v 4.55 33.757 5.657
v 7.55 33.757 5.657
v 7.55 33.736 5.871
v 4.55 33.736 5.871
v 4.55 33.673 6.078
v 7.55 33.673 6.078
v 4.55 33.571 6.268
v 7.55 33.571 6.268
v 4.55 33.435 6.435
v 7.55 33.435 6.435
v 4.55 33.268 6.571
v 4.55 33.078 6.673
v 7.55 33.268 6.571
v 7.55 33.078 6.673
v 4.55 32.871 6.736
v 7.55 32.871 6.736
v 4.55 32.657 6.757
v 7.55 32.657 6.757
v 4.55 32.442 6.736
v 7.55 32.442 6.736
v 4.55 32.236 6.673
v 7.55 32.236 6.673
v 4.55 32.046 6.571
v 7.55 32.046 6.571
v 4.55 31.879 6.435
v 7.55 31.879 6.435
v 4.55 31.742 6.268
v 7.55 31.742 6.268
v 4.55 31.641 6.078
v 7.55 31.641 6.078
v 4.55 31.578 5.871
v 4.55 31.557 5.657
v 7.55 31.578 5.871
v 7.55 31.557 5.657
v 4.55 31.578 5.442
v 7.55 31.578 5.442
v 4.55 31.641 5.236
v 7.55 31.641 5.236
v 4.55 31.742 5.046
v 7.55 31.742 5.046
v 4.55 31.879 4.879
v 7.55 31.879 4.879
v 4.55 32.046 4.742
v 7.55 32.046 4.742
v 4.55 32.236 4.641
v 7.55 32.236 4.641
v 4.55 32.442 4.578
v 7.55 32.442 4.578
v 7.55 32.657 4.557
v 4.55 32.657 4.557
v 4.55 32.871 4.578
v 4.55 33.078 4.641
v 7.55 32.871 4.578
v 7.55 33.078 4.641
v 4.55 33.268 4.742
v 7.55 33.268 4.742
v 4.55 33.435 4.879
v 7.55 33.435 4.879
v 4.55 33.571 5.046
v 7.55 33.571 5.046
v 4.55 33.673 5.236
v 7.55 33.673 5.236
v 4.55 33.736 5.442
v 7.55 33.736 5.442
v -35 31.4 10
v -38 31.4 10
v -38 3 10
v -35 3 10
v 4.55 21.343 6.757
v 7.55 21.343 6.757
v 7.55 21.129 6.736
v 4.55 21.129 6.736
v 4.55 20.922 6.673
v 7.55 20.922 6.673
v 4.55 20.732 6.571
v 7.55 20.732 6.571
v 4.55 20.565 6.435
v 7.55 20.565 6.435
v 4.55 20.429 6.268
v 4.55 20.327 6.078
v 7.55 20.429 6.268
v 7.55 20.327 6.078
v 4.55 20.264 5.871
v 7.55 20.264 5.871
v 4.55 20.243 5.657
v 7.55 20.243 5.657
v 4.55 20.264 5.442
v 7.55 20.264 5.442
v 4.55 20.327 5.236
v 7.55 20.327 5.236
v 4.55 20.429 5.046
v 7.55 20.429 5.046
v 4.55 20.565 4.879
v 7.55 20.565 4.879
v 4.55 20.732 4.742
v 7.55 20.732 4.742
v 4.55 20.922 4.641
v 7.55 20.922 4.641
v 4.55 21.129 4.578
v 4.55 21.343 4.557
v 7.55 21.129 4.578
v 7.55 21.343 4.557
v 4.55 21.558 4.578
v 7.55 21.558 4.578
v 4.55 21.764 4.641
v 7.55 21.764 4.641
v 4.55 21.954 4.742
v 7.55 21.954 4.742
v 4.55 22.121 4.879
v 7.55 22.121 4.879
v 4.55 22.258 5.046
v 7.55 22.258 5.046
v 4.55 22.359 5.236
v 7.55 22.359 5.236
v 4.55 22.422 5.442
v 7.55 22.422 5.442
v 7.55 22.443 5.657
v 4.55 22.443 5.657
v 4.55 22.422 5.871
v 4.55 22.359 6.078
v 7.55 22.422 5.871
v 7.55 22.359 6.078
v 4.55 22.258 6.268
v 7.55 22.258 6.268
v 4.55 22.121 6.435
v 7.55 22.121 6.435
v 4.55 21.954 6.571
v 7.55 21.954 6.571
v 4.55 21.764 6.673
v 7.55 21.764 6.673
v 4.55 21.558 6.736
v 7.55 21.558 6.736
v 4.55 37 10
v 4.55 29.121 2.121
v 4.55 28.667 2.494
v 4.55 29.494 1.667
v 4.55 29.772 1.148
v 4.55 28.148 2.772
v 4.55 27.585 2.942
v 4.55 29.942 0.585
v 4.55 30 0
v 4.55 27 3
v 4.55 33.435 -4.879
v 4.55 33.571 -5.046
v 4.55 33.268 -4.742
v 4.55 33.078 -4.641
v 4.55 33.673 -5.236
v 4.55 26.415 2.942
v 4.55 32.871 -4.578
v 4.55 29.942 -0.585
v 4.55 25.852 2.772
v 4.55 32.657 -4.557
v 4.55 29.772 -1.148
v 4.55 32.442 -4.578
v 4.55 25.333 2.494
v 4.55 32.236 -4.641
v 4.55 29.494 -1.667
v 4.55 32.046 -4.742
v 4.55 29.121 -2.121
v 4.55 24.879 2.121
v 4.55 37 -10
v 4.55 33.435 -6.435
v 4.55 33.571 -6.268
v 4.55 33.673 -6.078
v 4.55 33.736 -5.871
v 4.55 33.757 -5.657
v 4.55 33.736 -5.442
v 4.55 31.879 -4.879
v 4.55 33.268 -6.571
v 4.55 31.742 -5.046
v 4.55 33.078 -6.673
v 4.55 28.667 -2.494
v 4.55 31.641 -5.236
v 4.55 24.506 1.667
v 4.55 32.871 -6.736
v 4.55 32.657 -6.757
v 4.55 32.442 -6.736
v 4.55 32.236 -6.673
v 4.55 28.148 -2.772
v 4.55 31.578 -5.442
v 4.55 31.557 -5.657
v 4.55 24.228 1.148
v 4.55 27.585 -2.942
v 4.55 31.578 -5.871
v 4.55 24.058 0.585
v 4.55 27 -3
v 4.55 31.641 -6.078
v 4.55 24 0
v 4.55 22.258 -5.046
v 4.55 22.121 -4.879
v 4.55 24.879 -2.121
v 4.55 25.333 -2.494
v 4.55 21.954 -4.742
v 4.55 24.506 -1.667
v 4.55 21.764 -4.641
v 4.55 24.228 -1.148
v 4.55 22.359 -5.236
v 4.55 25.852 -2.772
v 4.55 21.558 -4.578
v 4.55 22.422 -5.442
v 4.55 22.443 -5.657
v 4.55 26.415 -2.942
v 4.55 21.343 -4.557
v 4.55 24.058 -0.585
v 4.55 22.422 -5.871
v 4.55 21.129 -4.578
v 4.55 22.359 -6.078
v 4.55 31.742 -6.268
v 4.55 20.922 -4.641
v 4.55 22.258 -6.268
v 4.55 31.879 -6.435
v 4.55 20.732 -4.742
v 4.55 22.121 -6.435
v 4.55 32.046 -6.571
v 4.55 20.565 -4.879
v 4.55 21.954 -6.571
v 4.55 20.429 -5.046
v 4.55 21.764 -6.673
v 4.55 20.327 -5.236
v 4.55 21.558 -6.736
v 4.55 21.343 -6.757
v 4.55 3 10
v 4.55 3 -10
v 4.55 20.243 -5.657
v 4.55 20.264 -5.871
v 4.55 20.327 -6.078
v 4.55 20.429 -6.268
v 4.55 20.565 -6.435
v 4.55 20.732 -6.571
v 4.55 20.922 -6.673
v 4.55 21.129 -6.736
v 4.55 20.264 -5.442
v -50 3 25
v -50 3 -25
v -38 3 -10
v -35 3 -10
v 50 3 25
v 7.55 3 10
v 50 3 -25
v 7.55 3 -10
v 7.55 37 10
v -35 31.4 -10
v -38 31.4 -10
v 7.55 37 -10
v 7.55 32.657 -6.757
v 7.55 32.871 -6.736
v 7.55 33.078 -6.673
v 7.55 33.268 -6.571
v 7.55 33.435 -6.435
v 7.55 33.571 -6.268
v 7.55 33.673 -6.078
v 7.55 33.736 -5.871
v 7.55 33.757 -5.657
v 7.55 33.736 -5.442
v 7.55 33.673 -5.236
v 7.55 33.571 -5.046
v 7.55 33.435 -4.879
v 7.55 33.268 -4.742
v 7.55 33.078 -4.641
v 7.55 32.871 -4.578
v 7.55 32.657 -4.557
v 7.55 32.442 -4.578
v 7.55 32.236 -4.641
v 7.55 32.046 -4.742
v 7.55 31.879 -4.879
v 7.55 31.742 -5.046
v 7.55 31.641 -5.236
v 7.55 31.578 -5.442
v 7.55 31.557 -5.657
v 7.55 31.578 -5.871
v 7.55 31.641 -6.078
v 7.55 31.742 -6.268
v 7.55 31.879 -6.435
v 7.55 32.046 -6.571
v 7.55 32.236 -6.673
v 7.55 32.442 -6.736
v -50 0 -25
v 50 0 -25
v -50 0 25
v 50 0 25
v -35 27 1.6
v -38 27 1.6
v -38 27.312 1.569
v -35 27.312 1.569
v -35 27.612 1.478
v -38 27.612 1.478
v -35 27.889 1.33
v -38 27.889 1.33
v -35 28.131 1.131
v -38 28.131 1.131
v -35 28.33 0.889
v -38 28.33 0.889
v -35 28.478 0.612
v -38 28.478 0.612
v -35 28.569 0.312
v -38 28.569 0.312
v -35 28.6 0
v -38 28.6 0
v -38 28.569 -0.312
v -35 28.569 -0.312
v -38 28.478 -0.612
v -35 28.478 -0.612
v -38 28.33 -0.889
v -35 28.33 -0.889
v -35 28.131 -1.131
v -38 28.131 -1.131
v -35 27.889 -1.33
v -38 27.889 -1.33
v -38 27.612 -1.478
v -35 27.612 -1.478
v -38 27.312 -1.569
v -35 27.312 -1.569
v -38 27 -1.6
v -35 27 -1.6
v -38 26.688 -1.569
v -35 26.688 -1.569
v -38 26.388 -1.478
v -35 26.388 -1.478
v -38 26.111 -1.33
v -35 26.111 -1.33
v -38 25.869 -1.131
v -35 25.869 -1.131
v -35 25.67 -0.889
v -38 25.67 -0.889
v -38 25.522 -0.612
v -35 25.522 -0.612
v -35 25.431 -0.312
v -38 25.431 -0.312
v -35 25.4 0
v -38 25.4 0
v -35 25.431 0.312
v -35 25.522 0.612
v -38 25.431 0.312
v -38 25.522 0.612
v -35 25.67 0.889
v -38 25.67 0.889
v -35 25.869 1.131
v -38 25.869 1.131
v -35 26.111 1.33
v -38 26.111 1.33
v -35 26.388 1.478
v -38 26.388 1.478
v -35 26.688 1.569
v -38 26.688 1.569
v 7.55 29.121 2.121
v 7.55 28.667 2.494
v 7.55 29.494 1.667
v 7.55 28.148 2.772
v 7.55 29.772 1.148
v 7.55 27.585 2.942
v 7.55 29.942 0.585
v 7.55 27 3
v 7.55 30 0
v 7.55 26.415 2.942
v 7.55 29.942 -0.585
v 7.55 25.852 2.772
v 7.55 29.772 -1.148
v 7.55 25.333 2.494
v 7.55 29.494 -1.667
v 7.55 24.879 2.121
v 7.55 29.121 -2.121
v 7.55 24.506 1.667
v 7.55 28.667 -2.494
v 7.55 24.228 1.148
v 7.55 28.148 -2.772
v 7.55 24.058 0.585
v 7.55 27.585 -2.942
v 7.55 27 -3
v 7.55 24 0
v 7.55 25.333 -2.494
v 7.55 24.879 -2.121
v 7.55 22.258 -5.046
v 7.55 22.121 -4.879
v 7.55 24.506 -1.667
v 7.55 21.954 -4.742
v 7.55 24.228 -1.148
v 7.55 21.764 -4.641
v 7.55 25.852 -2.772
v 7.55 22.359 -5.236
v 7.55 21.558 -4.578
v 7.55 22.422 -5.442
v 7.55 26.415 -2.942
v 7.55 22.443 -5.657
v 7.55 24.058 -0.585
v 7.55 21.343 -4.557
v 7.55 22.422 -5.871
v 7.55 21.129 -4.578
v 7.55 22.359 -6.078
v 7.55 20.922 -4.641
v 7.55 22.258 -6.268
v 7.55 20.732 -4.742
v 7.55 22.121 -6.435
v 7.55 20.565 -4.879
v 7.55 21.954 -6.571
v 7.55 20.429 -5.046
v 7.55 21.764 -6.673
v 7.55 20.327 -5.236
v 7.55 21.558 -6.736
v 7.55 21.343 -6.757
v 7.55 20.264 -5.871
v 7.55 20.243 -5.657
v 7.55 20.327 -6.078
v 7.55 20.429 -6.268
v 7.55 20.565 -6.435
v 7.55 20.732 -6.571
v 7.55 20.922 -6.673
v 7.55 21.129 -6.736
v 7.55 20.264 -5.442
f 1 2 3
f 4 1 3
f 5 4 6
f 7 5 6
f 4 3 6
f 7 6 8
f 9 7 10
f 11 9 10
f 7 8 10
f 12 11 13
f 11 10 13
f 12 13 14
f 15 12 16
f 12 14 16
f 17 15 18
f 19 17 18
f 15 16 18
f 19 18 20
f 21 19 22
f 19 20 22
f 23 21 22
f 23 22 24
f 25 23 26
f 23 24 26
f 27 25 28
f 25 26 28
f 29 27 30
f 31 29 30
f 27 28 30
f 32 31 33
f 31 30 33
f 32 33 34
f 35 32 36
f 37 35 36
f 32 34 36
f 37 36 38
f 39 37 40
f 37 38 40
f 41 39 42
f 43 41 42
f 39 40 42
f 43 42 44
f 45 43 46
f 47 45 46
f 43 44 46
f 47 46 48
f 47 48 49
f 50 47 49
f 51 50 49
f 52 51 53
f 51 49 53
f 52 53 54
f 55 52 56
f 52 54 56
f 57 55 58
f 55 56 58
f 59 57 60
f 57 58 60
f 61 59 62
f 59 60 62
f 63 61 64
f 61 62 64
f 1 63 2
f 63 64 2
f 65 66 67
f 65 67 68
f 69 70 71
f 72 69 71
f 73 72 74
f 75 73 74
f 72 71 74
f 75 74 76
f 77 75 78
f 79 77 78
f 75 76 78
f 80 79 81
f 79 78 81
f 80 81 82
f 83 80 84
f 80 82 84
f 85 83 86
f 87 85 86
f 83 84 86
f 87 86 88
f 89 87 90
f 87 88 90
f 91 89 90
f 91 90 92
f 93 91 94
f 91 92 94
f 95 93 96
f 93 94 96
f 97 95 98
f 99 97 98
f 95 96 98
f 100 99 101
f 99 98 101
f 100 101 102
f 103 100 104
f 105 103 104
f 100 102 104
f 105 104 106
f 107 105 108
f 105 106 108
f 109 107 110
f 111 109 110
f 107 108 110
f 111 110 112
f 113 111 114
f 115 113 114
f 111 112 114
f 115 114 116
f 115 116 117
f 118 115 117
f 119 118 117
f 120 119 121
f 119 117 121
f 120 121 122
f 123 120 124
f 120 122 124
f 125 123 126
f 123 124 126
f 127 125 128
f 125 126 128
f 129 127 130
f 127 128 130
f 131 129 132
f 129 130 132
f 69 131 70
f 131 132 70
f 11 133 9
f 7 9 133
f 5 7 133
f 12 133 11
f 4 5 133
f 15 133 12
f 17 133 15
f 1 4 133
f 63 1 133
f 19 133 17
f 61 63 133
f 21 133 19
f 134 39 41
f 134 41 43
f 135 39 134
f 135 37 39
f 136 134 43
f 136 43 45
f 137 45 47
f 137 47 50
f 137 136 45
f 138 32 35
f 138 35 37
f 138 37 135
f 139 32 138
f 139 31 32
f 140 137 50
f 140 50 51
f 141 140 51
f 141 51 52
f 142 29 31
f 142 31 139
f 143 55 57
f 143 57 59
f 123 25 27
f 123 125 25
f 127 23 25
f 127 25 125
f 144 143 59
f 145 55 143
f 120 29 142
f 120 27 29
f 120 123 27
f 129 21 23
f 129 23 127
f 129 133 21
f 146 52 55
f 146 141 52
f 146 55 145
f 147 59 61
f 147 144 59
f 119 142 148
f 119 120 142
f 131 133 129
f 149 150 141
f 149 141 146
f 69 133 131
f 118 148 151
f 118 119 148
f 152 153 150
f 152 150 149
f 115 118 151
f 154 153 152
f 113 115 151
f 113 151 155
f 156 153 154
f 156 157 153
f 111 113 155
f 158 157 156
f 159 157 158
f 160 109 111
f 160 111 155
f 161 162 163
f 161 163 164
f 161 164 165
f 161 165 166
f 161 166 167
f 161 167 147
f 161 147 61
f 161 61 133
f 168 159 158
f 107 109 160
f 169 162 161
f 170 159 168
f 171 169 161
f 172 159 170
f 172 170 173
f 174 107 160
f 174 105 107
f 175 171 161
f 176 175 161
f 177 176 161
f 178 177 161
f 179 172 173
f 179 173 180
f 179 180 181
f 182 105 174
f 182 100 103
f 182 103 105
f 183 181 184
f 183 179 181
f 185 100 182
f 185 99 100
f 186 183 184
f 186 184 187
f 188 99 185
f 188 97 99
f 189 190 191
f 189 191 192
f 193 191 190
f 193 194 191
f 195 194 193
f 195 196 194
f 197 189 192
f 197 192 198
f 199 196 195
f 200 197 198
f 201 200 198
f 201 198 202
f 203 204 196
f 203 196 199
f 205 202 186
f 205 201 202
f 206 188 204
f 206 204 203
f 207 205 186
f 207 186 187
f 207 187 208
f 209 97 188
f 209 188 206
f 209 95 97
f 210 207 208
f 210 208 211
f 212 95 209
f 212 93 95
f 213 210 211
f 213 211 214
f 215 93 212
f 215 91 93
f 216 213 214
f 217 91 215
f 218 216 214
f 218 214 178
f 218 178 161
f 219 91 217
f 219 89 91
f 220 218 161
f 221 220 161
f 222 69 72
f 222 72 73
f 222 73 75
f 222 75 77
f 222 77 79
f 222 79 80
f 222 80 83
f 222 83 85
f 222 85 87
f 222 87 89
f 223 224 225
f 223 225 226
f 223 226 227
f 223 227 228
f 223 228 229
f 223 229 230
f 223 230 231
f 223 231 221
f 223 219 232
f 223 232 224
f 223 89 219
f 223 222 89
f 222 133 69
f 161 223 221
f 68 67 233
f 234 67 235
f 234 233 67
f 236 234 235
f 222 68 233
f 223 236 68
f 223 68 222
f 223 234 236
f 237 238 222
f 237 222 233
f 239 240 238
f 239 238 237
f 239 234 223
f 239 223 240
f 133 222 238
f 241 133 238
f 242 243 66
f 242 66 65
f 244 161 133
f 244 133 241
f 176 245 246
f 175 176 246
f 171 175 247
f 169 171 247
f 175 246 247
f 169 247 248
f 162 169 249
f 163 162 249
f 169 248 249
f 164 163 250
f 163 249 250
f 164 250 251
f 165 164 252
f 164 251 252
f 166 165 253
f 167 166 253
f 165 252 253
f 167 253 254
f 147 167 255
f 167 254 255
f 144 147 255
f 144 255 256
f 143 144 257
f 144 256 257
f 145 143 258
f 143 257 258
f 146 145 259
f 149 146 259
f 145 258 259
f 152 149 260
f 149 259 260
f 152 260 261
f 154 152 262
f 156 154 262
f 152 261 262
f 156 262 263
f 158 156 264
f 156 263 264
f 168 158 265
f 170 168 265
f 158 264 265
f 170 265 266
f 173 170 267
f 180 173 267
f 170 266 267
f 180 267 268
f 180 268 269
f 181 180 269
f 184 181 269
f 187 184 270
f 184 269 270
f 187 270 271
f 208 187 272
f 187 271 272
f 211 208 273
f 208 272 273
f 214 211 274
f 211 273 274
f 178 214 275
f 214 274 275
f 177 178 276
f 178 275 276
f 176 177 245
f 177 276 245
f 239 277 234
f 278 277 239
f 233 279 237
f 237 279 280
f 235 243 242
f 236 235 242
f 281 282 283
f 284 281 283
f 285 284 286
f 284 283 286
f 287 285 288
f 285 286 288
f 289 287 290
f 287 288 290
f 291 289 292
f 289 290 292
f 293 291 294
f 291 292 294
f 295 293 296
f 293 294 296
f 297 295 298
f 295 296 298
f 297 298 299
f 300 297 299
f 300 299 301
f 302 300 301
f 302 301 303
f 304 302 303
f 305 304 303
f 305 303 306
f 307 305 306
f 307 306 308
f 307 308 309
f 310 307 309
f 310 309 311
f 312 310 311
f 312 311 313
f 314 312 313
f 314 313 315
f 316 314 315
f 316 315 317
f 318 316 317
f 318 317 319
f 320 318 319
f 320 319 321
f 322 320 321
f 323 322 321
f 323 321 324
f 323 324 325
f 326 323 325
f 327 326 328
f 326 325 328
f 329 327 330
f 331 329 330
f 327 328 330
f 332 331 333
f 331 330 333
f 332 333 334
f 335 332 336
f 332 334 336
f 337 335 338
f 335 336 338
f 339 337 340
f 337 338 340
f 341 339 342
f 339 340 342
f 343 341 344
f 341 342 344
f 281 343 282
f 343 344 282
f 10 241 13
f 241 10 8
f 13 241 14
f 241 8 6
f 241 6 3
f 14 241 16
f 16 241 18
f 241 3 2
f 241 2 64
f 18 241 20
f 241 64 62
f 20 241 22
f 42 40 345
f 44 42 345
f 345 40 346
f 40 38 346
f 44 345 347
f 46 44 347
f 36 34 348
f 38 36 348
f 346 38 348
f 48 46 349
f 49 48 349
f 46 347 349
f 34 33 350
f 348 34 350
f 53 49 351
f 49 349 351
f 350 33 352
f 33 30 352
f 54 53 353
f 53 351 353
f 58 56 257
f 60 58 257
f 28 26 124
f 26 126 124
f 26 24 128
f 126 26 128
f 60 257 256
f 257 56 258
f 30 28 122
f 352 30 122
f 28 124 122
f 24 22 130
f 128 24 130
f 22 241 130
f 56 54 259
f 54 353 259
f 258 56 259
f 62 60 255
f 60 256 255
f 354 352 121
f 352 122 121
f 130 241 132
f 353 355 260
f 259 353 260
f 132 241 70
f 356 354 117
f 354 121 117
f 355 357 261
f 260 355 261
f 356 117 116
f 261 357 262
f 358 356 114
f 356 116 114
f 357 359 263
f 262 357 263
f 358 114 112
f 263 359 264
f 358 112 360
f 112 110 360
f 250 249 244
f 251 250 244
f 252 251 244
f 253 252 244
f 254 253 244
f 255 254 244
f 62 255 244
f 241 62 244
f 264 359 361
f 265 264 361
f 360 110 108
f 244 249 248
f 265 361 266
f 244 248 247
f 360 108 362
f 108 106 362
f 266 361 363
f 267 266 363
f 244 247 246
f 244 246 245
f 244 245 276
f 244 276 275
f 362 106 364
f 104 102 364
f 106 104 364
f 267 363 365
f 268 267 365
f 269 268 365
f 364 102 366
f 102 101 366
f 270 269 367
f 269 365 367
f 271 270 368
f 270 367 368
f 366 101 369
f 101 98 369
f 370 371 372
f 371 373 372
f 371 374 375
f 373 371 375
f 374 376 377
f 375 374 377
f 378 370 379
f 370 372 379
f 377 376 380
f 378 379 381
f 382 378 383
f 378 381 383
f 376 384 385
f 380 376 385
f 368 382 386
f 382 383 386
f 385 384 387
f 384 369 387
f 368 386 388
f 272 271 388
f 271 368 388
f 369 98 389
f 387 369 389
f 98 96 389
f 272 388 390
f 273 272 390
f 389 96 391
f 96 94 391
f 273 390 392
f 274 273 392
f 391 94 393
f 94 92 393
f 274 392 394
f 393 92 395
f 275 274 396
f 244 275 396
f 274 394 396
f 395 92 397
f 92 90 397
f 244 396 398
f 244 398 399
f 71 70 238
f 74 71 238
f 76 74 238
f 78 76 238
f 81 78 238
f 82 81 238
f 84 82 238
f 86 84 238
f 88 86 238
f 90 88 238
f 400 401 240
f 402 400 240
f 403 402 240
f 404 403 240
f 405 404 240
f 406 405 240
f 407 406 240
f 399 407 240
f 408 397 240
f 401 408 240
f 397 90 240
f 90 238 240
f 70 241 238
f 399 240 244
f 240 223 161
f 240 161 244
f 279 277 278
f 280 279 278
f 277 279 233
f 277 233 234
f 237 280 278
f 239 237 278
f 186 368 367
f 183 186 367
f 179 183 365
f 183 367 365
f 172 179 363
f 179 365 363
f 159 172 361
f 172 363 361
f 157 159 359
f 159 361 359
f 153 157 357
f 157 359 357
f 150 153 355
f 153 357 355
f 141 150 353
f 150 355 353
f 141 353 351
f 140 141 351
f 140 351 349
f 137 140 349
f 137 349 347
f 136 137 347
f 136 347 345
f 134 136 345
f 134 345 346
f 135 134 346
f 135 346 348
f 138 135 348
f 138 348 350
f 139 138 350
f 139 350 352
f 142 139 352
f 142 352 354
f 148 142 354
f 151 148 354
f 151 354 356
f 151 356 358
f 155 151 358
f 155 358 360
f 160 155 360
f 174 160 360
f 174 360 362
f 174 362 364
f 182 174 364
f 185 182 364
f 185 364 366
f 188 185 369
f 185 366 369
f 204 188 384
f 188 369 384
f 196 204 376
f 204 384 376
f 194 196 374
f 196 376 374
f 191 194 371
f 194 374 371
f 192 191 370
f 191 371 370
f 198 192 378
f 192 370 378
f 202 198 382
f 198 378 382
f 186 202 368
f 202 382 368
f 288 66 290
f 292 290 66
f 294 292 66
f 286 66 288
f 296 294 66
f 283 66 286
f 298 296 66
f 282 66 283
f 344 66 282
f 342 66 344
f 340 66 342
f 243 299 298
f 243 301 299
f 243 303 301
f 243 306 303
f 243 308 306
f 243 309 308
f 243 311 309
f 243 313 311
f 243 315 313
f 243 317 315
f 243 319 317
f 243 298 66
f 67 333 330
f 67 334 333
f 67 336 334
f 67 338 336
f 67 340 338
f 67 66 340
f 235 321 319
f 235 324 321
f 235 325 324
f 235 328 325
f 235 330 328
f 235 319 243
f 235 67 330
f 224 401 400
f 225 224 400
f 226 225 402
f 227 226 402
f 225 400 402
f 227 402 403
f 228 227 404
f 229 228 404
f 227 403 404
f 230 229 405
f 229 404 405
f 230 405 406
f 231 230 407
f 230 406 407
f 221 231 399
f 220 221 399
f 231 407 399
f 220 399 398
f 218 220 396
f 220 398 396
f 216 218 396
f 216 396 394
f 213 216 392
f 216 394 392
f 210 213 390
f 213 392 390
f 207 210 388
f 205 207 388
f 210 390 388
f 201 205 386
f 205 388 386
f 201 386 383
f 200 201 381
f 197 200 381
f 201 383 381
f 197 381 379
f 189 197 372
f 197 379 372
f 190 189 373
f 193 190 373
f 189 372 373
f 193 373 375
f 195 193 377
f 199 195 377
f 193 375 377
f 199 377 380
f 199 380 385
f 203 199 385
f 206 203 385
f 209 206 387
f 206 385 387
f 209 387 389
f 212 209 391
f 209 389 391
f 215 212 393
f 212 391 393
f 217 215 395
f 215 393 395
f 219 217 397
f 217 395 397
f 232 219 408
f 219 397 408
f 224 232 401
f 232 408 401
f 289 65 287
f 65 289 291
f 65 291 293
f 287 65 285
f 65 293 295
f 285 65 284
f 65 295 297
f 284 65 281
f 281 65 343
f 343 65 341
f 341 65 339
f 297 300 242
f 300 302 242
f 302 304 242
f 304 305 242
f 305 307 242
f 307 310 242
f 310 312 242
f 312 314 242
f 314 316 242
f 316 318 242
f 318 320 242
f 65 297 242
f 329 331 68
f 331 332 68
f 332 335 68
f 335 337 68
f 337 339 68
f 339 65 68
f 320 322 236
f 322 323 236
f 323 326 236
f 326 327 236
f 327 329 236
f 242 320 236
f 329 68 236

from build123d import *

# Parameters (mm, degrees)
SKETCH1_W           = 100
SKETCH1_H           = 50
SKETCH1_W_2         = 3
SKETCH1_H_2         = 20
BOSS_EXTRUDE1_DEPTH = 3
SKETCH1_3_W         = 3
SKETCH1_3_H         = 20
BOSS_EXTRUDE2_DEPTH = 37
SKETCH1_4_W         = 3
SKETCH1_4_H         = 20
BOSS_EXTRUDE3_DEPTH = 31.4
SKETCH2_R           = 3
SKETCH2_R_2         = 1.1
CUT_EXTRUDE1_DEPTH  = 3
CIRPATTERN1_COUNT   = 4
SKETCH3_R           = 1.6
CUT_EXTRUDE2_DEPTH  = 15


with BuildPart() as part:
    # Sketch1 → Boss-Extrude1 (new body)
    with BuildSketch(Plane(origin=(0, 0, 0), x_dir=(1, 0, 0), z_dir=(0, 1, 0))):
        Rectangle(SKETCH1_W, SKETCH1_H)
        with Locations((-36.5, 0)):
            Rectangle(SKETCH1_W_2, SKETCH1_H_2, mode=Mode.SUBTRACT)
        with Locations((6.05, 0)):
            Rectangle(SKETCH1_W_2, SKETCH1_H_2, mode=Mode.SUBTRACT)
    extrude(amount=BOSS_EXTRUDE1_DEPTH)

    # Sketch1<3> → Boss-Extrude2 (add)
    with BuildSketch(Plane(origin=(0, 0, 0), x_dir=(1, 0, 0), z_dir=(0, 1, 0))):
        with Locations((6.05, 0)):
            Rectangle(SKETCH1_3_W, SKETCH1_3_H)
    extrude(amount=BOSS_EXTRUDE2_DEPTH)

    # Sketch1<4> → Boss-Extrude3 (add)
    with BuildSketch(Plane(origin=(0, 0, 0), x_dir=(1, 0, 0), z_dir=(0, 1, 0))):
        with Locations((-36.5, 0)):
            Rectangle(SKETCH1_4_W, SKETCH1_4_H)
    extrude(amount=BOSS_EXTRUDE3_DEPTH)

    # Sketch2 → Cut-Extrude1 (cut)
    with BuildSketch(Plane(origin=(7.55, 0, 0), x_dir=(0, 0, -1), z_dir=(1, 0, 0))):
        with Locations((0, 27)):
            Circle(SKETCH2_R)
        with Locations((5.656854249, 32.656854249)):
            Circle(SKETCH2_R_2)
    cut_extrude1 = extrude(amount=-CUT_EXTRUDE1_DEPTH, mode=Mode.SUBTRACT)

    # CirPattern1: Cut-Extrude1 ×4 about axis
    cirpattern1_axis = Axis((0, 27, 0), (1, 0, 0))
    for i in range(1, CIRPATTERN1_COUNT):
        add(cut_extrude1.rotate(cirpattern1_axis, i * 360 / CIRPATTERN1_COUNT), mode=Mode.SUBTRACT)

    # Sketch3 → Cut-Extrude2 (cut)
    with BuildSketch(Plane.ZY.offset(50)):
        with Locations((0, 27)):
            Circle(SKETCH3_R)
    extrude(amount=-CUT_EXTRUDE2_DEPTH, mode=Mode.SUBTRACT)


solid = part.part
